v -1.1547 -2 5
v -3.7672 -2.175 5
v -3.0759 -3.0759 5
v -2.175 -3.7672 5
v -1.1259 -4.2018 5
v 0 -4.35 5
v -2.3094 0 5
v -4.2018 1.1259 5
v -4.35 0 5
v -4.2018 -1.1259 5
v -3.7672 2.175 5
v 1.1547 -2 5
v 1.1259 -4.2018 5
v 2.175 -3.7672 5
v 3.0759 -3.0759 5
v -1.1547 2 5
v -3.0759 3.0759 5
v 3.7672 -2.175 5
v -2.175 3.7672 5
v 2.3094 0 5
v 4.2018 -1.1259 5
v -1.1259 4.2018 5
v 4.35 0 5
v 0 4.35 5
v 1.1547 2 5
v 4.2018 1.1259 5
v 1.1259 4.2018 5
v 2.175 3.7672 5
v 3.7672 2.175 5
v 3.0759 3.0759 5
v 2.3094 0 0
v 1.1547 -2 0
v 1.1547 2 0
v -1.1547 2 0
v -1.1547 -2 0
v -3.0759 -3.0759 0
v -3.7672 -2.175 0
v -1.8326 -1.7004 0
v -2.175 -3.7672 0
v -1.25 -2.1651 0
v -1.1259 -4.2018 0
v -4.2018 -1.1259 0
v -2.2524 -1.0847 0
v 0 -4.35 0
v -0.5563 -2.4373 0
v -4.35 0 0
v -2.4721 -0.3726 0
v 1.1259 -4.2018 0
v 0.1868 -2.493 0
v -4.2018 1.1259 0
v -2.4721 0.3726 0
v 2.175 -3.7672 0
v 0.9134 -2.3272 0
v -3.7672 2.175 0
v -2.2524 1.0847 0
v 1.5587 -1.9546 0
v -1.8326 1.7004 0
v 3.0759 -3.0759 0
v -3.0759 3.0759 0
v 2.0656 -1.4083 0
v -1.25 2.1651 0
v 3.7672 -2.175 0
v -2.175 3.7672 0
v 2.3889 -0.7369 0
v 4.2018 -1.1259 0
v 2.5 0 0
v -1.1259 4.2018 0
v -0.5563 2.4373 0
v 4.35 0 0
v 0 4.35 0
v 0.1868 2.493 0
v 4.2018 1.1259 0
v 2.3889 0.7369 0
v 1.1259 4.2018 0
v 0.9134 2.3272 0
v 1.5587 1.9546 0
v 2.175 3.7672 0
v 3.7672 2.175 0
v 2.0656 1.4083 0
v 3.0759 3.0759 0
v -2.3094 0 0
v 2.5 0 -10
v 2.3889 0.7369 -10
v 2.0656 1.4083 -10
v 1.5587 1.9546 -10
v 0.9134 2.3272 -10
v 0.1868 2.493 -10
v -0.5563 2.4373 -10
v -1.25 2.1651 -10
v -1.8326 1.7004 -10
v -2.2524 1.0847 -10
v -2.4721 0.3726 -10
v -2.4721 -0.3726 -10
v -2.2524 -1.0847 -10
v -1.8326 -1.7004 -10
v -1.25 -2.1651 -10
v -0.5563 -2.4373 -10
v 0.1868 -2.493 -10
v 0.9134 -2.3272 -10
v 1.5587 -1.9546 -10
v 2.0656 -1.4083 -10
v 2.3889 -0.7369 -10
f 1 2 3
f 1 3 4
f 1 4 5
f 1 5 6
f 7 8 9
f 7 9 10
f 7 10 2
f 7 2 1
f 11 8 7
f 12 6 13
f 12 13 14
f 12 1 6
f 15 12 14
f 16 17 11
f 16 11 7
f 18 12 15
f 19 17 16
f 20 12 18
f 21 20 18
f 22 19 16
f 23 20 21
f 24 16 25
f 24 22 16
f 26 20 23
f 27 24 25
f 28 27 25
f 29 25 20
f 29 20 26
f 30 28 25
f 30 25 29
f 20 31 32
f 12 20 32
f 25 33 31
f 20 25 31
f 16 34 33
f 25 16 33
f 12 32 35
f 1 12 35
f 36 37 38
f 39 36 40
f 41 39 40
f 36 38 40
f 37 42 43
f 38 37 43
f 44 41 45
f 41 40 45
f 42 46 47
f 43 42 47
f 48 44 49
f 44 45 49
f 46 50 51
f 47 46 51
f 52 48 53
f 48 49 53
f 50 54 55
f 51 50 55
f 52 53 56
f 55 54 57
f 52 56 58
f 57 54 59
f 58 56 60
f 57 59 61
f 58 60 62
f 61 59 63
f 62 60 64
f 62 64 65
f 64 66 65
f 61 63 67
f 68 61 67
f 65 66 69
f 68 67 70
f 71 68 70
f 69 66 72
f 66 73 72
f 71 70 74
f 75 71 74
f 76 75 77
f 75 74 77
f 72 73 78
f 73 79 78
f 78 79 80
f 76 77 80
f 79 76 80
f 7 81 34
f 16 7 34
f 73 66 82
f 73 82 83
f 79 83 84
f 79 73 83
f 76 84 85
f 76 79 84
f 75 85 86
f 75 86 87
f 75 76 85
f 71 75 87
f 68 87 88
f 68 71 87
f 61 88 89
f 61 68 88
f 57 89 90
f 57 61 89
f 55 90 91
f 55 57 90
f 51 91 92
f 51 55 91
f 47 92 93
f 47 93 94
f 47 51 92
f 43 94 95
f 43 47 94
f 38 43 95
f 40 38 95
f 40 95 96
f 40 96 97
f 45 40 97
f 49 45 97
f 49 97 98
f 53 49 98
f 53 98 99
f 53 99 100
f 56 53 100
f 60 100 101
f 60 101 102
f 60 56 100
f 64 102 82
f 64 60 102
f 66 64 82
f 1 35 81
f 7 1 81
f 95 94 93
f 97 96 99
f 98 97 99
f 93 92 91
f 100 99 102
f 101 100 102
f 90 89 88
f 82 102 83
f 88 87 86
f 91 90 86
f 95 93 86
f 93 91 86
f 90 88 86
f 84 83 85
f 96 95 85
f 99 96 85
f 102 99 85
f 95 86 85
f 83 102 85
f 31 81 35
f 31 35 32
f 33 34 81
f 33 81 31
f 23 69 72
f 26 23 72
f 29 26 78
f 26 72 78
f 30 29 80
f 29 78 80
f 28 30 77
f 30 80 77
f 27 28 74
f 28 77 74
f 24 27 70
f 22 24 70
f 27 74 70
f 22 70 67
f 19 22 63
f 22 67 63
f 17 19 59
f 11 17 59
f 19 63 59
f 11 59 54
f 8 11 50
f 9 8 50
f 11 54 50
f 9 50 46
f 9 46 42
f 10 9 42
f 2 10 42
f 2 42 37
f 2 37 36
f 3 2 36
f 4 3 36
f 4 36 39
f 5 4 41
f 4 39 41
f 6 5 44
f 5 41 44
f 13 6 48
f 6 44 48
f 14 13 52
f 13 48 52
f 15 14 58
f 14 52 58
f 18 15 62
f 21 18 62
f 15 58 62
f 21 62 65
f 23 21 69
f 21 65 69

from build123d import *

# Parameters (mm, degrees)
F0_R     = 2.5
F1_DEPTH = 10
F0_R_2   = 4.35
F2_DEPTH = 5


with BuildPart() as f1:
    # F0 (on Top) → F1 (new body)
    with BuildSketch(Plane.XY):
        Circle(F0_R)
        Polygon((2.309401, 0), (1.154701, -2), (-1.154701, -2), (-2.309401, 0), (-1.154701, 2), (1.154701, 2), align=None, mode=Mode.SUBTRACT)
        Polygon((-1.154701, -2), (1.154701, -2), (2.309401, 0), (1.154701, 2), (-1.154701, 2), (-2.309401, 0), align=None)
    extrude(amount=-F1_DEPTH)

    # F0 (on Top) → F2 (join)
    with BuildSketch(Plane.XY):
        Circle(F0_R_2)
        Circle(F0_R, mode=Mode.SUBTRACT)
        Circle(F0_R)
        Polygon((2.309401, 0), (1.154701, -2), (-1.154701, -2), (-2.309401, 0), (-1.154701, 2), (1.154701, 2), align=None, mode=Mode.SUBTRACT)
    extrude(amount=F2_DEPTH)


solid = f1.part
